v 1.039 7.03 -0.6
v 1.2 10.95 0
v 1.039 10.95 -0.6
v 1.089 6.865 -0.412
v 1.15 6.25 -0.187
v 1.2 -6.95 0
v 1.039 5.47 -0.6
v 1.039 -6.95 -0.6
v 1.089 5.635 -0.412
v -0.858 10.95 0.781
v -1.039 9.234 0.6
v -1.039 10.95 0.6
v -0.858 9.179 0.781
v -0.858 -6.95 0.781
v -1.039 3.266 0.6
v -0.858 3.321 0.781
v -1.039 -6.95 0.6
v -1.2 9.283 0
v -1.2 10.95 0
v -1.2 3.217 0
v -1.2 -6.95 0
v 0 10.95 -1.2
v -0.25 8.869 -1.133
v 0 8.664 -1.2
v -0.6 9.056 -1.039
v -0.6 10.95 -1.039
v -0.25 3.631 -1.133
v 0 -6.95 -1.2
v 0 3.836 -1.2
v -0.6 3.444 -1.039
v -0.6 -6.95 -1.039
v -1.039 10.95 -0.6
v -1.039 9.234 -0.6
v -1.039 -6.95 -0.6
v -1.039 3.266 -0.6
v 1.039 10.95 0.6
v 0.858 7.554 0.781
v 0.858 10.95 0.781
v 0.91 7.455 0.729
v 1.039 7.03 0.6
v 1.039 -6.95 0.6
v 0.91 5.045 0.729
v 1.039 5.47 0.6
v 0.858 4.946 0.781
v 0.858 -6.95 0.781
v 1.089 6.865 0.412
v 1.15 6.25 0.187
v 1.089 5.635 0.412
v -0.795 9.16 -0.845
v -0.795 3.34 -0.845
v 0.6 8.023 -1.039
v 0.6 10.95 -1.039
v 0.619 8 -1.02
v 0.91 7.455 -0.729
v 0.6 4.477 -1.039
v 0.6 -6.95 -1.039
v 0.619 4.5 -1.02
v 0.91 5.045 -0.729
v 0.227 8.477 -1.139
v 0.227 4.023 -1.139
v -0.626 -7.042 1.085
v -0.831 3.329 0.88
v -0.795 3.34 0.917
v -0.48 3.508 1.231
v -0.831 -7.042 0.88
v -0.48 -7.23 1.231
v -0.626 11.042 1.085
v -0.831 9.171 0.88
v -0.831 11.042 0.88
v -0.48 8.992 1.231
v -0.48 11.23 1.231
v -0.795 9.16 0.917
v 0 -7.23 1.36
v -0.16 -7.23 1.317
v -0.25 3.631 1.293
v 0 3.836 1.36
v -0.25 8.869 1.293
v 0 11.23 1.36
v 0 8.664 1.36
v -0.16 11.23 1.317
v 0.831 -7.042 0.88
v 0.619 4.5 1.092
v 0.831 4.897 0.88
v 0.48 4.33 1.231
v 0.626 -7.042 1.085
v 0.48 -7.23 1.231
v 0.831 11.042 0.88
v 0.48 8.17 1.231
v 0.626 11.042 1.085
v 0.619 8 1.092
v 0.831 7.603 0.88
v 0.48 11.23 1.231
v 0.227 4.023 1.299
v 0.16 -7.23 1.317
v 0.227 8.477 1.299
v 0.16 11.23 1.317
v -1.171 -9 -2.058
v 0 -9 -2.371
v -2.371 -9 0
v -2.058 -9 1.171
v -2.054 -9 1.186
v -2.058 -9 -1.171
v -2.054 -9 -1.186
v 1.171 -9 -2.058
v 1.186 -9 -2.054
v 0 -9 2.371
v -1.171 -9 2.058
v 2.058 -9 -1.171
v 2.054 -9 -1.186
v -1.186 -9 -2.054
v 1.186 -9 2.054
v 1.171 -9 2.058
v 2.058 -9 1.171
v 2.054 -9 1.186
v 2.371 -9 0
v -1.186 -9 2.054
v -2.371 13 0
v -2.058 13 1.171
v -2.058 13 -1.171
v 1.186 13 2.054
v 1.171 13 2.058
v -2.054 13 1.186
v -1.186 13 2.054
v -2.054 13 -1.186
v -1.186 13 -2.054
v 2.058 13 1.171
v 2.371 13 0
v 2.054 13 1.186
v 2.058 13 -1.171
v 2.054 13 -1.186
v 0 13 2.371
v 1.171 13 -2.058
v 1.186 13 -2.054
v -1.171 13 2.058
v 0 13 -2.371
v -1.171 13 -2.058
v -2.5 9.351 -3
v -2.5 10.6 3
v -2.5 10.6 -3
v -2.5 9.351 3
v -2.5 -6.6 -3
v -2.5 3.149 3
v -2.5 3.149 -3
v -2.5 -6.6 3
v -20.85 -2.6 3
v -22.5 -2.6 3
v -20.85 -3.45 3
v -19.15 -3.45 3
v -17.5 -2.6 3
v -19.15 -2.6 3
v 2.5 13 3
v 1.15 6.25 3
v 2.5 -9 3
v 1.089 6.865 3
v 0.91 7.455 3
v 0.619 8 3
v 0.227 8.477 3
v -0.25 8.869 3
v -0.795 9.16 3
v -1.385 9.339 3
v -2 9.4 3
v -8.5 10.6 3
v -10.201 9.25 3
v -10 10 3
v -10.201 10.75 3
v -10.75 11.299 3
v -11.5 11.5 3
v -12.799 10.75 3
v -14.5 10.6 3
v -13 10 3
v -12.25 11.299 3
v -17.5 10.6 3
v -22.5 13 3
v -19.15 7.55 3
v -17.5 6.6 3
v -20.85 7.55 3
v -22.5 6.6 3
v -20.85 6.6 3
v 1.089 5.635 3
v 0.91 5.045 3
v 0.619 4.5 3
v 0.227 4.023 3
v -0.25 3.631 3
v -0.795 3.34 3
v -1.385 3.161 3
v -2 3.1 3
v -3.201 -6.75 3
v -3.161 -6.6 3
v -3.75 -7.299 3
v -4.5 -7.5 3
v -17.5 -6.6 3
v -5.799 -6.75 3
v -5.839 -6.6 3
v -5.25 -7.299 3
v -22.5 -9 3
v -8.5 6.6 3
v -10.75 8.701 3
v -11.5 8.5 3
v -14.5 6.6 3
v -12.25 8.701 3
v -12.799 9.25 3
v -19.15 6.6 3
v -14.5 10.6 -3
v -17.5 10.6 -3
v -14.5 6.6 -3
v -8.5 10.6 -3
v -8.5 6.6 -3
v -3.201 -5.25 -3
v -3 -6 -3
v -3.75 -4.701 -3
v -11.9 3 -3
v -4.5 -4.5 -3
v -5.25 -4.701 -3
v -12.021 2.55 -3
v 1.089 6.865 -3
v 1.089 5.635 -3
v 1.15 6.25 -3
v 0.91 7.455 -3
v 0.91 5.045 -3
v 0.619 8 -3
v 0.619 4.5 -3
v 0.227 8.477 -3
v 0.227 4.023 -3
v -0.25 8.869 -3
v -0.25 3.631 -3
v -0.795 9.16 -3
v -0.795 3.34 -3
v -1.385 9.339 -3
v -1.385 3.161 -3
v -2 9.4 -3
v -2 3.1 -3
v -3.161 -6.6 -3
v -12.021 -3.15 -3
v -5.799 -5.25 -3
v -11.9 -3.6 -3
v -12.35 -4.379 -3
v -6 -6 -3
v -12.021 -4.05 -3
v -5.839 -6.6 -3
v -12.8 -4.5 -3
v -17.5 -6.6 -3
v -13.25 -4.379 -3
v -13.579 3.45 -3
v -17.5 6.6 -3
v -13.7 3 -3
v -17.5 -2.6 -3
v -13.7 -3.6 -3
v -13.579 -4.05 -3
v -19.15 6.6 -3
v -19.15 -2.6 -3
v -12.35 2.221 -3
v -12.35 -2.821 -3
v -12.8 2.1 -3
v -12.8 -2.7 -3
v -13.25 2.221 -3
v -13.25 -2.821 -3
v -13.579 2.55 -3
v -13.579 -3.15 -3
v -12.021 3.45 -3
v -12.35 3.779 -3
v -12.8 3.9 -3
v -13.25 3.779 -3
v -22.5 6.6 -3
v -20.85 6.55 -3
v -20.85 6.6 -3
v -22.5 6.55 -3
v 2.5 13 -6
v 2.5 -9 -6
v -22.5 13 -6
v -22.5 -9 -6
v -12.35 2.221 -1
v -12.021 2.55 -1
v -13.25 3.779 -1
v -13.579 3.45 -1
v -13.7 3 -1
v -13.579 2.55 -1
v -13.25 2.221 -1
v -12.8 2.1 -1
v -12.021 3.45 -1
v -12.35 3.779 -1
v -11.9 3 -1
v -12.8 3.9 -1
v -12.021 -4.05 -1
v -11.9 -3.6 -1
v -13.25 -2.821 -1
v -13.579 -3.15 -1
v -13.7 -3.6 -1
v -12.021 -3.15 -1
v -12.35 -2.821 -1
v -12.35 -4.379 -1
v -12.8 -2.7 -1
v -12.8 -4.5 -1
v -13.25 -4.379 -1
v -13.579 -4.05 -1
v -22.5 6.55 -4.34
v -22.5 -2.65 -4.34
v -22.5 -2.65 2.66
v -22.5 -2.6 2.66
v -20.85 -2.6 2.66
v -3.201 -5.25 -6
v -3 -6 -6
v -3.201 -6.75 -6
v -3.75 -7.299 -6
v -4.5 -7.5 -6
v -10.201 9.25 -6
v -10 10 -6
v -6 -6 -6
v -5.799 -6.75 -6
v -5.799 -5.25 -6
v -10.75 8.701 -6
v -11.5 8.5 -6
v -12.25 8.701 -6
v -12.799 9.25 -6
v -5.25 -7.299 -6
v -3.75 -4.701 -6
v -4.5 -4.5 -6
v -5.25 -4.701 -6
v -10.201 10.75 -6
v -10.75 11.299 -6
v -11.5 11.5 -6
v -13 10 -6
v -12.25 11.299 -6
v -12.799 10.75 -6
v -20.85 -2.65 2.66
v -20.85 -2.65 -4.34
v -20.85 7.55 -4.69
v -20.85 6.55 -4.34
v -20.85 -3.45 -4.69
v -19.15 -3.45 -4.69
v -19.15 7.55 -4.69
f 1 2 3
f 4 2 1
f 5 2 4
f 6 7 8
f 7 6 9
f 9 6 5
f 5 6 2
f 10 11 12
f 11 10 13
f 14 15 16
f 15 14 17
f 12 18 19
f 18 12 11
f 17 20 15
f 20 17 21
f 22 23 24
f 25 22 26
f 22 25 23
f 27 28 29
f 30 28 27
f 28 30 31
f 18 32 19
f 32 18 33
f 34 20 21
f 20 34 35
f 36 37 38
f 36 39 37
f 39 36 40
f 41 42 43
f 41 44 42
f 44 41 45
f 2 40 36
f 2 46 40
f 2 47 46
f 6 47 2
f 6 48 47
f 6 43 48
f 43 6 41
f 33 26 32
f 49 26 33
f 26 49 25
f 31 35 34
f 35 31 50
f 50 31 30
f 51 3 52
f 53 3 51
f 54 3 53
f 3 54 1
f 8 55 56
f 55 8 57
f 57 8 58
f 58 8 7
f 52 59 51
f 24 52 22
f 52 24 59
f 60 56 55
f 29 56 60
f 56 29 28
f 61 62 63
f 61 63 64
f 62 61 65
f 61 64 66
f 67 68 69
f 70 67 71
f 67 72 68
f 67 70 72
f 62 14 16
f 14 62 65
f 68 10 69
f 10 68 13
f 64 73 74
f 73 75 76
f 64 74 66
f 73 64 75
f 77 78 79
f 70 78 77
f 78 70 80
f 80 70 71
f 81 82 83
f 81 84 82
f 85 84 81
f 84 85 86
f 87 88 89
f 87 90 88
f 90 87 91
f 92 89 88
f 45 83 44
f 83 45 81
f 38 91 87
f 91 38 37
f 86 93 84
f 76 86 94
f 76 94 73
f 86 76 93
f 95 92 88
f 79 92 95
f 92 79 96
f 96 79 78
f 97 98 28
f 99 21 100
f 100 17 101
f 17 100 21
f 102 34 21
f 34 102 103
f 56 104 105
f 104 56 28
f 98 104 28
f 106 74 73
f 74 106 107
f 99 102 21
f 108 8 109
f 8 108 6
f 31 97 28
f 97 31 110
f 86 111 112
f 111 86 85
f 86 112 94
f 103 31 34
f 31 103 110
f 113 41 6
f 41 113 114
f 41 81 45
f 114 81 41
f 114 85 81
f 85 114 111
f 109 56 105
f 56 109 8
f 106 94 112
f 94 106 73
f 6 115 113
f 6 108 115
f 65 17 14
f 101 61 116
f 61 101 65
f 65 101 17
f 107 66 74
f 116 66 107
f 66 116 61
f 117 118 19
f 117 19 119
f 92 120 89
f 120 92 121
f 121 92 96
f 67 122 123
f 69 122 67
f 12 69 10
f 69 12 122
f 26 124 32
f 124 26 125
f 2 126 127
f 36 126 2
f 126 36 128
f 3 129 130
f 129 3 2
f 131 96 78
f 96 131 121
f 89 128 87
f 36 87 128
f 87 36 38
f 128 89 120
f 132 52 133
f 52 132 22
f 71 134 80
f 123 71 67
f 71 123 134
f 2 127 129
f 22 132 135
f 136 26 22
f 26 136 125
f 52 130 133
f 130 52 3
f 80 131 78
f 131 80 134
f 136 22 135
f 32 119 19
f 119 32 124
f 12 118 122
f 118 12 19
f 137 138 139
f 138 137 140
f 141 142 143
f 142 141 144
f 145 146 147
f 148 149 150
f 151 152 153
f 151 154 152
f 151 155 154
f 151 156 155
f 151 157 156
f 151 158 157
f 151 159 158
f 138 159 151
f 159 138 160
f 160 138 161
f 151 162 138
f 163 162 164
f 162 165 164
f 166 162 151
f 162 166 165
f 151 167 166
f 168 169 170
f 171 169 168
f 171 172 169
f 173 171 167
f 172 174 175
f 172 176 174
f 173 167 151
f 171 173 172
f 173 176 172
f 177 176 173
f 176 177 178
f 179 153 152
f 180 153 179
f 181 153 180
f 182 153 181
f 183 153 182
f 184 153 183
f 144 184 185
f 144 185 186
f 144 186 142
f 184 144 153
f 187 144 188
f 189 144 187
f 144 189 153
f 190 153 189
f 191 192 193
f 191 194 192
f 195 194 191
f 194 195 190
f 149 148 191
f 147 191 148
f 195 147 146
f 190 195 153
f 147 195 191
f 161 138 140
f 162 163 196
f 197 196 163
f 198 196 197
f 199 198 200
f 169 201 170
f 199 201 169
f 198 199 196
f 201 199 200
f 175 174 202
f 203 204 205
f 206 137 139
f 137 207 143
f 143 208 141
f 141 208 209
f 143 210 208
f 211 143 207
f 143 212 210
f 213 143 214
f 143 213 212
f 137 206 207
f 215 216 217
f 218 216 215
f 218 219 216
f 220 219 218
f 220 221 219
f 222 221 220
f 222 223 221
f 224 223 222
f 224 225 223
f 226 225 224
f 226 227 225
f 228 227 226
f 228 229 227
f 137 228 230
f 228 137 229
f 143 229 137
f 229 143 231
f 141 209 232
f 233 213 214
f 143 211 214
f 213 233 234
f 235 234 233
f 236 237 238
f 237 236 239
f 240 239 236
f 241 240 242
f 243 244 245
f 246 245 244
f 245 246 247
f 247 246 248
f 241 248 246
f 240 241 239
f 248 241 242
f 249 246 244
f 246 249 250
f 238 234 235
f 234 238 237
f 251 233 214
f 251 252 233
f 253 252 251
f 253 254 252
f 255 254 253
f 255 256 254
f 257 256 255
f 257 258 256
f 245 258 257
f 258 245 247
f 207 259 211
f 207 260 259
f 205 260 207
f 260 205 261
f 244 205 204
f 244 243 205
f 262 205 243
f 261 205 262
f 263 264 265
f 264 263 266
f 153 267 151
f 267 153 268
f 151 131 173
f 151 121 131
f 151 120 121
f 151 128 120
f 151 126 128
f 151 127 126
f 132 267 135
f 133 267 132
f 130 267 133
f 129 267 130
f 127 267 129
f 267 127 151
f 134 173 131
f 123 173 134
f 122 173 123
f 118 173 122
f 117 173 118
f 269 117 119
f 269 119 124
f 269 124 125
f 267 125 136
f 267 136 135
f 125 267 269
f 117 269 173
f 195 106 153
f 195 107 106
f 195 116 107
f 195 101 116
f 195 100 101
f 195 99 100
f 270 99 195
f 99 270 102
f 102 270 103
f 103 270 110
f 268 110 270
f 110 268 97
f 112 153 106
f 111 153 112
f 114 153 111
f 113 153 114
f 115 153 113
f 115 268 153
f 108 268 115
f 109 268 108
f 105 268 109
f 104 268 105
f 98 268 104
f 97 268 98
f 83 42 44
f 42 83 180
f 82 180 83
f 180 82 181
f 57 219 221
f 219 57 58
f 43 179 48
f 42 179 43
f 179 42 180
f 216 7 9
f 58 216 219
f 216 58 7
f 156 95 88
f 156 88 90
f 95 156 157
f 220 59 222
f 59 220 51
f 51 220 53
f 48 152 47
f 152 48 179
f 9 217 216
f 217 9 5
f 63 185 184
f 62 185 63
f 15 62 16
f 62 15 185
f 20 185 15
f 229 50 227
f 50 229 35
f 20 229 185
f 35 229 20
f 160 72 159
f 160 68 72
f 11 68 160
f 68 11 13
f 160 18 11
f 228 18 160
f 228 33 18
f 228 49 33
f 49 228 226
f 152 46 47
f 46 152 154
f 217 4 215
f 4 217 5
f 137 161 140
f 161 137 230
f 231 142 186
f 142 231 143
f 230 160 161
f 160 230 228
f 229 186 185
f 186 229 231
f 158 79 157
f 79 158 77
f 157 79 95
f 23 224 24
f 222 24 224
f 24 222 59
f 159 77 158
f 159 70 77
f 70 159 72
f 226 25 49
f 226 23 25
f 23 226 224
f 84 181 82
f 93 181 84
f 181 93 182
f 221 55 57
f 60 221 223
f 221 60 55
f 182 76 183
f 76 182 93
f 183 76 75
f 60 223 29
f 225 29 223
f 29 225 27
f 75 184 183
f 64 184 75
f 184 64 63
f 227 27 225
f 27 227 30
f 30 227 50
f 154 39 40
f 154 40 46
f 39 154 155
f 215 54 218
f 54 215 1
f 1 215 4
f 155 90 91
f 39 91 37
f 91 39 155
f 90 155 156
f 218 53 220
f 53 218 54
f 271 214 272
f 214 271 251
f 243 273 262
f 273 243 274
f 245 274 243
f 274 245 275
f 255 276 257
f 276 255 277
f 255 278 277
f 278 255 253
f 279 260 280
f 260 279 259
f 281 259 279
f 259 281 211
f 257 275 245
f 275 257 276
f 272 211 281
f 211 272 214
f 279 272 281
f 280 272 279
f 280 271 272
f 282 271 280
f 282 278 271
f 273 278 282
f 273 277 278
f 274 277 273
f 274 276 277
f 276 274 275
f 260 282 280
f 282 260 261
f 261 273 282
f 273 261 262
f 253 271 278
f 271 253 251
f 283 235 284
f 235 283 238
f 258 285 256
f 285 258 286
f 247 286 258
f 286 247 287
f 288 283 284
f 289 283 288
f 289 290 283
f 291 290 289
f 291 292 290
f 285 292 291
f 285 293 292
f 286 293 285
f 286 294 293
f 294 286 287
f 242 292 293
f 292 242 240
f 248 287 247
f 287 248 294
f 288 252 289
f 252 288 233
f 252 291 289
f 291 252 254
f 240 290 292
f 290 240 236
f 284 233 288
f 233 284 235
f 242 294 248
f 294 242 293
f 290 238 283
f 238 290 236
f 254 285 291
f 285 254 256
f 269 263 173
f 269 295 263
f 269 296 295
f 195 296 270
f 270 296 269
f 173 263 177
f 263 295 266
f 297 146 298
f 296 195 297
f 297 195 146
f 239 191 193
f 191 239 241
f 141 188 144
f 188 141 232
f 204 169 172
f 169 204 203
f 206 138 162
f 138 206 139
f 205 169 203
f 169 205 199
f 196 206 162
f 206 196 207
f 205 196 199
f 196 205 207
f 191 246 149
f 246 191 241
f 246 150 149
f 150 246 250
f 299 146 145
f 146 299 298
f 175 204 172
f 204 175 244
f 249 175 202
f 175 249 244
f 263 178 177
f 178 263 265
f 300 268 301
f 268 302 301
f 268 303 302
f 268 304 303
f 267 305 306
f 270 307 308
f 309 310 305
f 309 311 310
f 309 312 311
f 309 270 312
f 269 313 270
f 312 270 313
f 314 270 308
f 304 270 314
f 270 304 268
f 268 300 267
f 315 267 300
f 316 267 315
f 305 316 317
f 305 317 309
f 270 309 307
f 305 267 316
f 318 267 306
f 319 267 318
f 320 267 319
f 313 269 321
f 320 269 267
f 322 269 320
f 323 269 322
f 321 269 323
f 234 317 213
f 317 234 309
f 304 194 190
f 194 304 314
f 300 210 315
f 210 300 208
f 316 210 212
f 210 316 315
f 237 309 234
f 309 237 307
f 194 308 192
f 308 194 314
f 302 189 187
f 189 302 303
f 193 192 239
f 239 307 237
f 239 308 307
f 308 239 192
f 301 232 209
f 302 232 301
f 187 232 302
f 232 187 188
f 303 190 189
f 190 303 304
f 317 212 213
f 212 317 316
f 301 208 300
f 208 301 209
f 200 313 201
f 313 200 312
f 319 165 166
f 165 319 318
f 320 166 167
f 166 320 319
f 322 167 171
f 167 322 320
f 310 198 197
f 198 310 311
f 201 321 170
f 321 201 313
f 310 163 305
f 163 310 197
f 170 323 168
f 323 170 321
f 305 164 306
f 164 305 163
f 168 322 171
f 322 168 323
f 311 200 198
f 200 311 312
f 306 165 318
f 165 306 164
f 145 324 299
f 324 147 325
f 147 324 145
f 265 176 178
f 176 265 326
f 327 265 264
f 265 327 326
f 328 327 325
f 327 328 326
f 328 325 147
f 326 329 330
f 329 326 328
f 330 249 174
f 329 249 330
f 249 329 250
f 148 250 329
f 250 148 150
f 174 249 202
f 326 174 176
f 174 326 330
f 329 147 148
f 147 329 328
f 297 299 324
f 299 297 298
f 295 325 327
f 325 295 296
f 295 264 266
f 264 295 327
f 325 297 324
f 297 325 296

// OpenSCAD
// switch D2F-01L2-D with big roller 5mm dia
// https://omronfs.omron.com/en_US/ecb/products/pdf/en-d2f.pdf

// prusa this logic in its original IR filament sensor
// sensor OUT:
// 0 (LOW)  filament inserted
// 1 (HIGH) filament runout

// MK2S 10-pin connector looking at PCB pins
// ---------
// x x x x x
// - s x - +
// ---------
// -=GND, +=+5V, s=signal

// MK3 10-pin connector looking at PCB pins, notch on top
// ---   ---
// x x x x x
// s x x - +
// ---------
// -=GND, +=+5V, s=signal

// switch pinout, button on top left
//  _-___
// |_____|
//  N O C
//
//  N-O : NO (normally open)
//  N-C : NC (normally closed)

// connect bare switch
// - O
// + C
// s N

adjust_click = 0.2; // to reliably click move +:closer -:away from filament
filament_hole_d = 2.4; // 1.75mm should freely passthru

module switch()
{
  swbox = [6.5,12.7,5.7];
  hole_pos = [[5,3],[5,-3.5],[5,-3.8]];
  hole_dia = 2;
  roller = [5,4]; // dxh
  roller_pos = [[-6.3,12.7/2,0],[-4.5,12.7/2+0.2,0]];
  // body
  difference()
  {
    translate([swbox[0]/2,0,0])
      cube(swbox, center=true);
    // holes
    for(i=[0,1,2])
    {
      translate(hole_pos[i])
        cylinder(d=hole_dia,h=swbox[2]+1,$fn=12,center=true);
    }
  }
  // roller
  for(i=[0,1])
    translate(roller_pos[i])
      cylinder(d=roller[0],h=roller[1],$fn=32,center=true);
}

module filament()
{
  translate([0,0,0])
    rotate([90,0,0])
    cylinder(d=1.75,h=70,$fn=12,center=true);
}

module filament_guide()
{
  difference()
  {
    union()
    {
      // guide block
      translate([0,2,0])
        cube([5,22,6],center=  true);
    }
    // roller cut
    translate([2,6.25,0])
    cylinder(d=6.3,h=10,$fn=32,center=true);
    // filament hole thru all
    rotate([90,0,0])
    {
      cylinder(d=filament_hole_d,h=50,$fn=12,center=true);
      // overhang fix
      translate([0,0.4,0])
        cylinder(d=filament_hole_d*0.8,h=50,$fn=12,center=true);
      // conical lead-in
      translate([0,0,8])
        cylinder(d1=filament_hole_d,d2=filament_hole_d*2,h=2.1,$fn=12,center=true);
      // conical lead-out
      if(1)
      translate([0,0,-12])
        cylinder(d2=filament_hole_d,d1=filament_hole_d*2,h=2.1,$fn=12,center=true);
    }
  }
}

module holder_sticks()
{
  sticks_h=2;
  sticks_pos=[[-8.5+13.5,3,-2],[-8.5+13.5,-3.6,-2]];
  for(i=[0,1])
    translate(sticks_pos[i])
      rotate([0,0,0])
        cylinder(d=1.8,h=sticks_h,$fn=12,center=true);
}

module holder_bars()
{
  // filament entry side
  translate([4+11.5-3,-7.8,0])
    cube([20,2.4,6],center=true);
  // filament exit side
  translate([4+11.5-3,11.8,0])
    cube([20,2.4,6],center=true);
  // switch side near roller
  translate([11.5,9.8,0])
    cube([6,6.4,6],center=true);
  // holds pcb filament entry side
  translate([20,-4.6,0])
    cube([5,4,6],center=true);
  // holds pcb filament exit side
  translate([20,8.6,0])
    cube([5,4,6],center=true);
}

module baseplate()
{
    translate([10,2,-1.5-6/2])
      cube([25,22,3],center=true);
}

module screw_holes()
{
  mounting_holes=[[4.5,-6],[11.5,10]];
     // mounting holes
  for(i=[0,1])
      translate(mounting_holes[i])
        rotate([0,0,90])
          cylinder(d=3,h=20,$fn=12,center=true);
}

connector_pcb_cube=[1.7,11,7.7];
connector_pcb_pos=[20,2.05,-0.84];

module connector_pcb(scl=[1,1,1])
{
  translate(connector_pcb_pos)
  scale(scl)
  cube(connector_pcb_cube,center=true);
  // connector front cut
  translate(connector_pcb_pos+[2,-0.1,0])
    cube([5,9.2,7],center=true);
}


scale([-1,1,1]) // mirror X-direction, cable on the left
{
switch_pos=[8-adjust_click,0,0]; // adjust X to reliably clock with filament inserted
translate(switch_pos)
  %switch();
%filament();
%connector_pcb();
filament_guide();
translate(switch_pos)
  holder_sticks();
difference()
{
  union()
  {
    filament_guide();
    baseplate();
    holder_bars();
  }
  screw_holes();
  connector_pcb();
}
}
